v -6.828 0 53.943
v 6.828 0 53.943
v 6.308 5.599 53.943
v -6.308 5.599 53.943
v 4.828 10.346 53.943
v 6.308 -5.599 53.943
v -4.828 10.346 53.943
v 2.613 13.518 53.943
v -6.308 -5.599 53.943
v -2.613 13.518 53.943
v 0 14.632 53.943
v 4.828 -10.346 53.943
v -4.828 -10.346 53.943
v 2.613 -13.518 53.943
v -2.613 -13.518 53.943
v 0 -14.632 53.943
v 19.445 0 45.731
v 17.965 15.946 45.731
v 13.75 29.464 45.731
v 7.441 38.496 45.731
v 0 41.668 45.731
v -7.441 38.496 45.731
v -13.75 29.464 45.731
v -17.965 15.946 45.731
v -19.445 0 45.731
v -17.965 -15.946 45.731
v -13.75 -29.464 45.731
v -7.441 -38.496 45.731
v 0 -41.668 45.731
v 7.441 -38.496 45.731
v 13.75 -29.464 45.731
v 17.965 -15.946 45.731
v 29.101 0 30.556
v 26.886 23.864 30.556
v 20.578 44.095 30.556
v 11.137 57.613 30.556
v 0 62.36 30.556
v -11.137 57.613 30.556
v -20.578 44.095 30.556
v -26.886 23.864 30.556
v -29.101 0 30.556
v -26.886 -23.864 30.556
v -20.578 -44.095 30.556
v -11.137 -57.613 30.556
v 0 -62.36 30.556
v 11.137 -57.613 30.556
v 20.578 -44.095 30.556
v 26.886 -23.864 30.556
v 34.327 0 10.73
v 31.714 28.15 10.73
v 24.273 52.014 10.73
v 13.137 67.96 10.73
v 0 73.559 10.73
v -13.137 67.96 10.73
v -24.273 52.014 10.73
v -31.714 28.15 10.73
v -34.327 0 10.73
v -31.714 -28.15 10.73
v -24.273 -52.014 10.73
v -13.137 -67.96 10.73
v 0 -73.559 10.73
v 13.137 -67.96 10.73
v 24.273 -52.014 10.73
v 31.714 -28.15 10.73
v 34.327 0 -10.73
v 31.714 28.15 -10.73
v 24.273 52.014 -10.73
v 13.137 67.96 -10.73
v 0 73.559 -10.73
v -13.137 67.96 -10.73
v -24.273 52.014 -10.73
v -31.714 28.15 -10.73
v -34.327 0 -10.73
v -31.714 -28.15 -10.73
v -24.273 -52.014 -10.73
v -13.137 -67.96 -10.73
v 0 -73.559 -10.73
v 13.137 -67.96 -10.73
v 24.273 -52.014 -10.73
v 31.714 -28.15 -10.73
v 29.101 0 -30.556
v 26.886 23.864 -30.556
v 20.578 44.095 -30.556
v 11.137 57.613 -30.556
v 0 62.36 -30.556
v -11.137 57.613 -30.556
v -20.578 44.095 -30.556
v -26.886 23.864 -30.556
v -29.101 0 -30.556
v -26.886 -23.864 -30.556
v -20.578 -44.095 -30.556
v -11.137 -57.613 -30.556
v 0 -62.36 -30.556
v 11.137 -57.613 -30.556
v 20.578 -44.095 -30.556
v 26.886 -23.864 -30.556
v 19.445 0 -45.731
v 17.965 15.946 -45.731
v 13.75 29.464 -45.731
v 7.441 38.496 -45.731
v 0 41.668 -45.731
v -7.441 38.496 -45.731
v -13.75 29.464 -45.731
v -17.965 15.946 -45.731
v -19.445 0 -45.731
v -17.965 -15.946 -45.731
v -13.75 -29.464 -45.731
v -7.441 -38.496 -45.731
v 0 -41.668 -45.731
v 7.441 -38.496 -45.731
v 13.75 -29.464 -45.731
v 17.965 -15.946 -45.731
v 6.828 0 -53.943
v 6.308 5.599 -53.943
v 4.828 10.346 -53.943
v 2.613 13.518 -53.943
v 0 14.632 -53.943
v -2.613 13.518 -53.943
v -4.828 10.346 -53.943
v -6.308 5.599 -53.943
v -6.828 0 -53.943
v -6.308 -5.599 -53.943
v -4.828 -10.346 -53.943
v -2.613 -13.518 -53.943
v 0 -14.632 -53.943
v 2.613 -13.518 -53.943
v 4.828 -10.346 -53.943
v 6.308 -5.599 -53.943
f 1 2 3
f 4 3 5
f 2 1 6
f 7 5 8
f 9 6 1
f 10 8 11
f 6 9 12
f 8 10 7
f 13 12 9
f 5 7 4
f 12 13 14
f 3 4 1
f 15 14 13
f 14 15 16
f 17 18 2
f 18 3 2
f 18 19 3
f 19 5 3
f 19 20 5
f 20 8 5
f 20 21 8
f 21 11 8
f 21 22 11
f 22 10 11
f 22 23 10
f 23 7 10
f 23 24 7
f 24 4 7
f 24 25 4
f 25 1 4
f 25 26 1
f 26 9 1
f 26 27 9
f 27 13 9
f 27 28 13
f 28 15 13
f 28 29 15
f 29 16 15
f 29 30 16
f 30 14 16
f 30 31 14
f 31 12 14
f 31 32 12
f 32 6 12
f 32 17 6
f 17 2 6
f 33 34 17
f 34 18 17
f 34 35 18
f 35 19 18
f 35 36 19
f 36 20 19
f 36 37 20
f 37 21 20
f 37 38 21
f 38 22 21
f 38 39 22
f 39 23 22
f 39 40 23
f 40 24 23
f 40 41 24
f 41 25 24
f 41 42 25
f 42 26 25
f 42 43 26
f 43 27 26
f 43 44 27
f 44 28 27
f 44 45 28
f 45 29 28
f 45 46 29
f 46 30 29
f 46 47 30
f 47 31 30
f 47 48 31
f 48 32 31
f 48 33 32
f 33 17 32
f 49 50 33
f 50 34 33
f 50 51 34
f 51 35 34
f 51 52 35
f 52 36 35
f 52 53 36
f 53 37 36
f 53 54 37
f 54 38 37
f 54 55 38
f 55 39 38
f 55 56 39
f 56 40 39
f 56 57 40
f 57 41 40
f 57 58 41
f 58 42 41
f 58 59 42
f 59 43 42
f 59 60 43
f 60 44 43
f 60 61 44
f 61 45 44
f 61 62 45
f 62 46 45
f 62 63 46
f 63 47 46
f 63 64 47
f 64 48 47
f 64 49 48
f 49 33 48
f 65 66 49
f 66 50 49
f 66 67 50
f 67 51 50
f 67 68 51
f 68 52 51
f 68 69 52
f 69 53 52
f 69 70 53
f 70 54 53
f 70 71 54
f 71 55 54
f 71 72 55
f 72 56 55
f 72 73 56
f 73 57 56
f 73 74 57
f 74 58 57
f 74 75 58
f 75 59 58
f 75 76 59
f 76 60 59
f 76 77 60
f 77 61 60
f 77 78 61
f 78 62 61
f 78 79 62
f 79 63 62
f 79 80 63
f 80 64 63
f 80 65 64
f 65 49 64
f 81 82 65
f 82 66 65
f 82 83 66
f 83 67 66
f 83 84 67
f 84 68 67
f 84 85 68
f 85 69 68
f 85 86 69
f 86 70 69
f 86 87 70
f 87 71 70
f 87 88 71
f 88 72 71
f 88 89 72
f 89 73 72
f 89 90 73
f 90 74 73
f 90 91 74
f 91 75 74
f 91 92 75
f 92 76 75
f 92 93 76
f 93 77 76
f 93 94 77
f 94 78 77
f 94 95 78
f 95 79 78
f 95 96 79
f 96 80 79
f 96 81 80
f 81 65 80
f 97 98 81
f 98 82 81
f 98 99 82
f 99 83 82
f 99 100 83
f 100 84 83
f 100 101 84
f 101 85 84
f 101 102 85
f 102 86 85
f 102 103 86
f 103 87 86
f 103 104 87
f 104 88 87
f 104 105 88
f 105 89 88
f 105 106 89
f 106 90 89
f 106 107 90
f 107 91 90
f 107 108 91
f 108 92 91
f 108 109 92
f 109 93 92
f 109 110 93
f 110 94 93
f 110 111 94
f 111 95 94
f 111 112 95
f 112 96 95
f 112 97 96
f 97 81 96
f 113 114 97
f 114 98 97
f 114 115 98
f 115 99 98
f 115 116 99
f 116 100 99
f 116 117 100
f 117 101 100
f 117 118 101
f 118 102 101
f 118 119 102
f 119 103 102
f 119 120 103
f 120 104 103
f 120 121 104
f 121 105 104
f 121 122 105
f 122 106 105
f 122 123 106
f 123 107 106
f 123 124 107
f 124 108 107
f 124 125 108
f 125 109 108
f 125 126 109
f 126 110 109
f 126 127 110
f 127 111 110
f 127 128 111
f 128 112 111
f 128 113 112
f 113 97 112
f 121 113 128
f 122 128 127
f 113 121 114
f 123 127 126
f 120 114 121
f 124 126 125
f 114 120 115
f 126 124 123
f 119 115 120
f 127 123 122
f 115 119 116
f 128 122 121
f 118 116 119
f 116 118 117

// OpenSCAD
// Generated by SolidPython 1.0.1 on 2020-07-29 00:46:48


scale(v = [7, 15, 11]) {
	sphere(r = 5);
}
/***********************************************
*********      SolidPython code:      **********
************************************************
 
# import packages: SolidPython
from solid import *
from solid.utils import *
from itertools import chain, combinations, permutations


class Resize:

    def __init__(self, scad_file):
        self.scad_file = scad_file
        #self.scad_file = import_scad(scad_file)
        # cone/cylinder param:
        self.r1 = 0
        self.r2 = 0
        self.h = 0
        # rectangular prism param:
        self.w = 0
        self.l = 0
        # ellipse param:
        self.r = 0

    # import OpenScad code (file name corresponds to shape)


    # classify shape + parameters
    def assign(self, param1, param2, param3):
        if self.scad_file == 'cone.scad':
            self.r1 = param1
            self.r2 = param2
            self.h = param3
        elif self.scad_file == 'cylinder.scad':
            self.r1 = param1
            self.r2 = param2
            self.h = param3
        elif self.scad_file == 'rectangularPrism.scad':
            self.h = param1
            self.l = param2
            self.w = param3
        else:
            self.r = param1
            self.h = param2

    # resize parameters
    def iterate(self):
        x = range(3, 20, 2)
        i = 1
        if self.scad_file == 'cone.scad':
            tempList = list(permutations(x, 2))
            for temp in tempList:
                param1 = temp[0]
                param2 = temp[1]
                filepath = 'produced_scad_files/' + 'cone' + str(param1) + '_' + str(param2) + '_' + '.scad'
                scad_render_to_file(cylinder(h=param1, r1=param2, r2=0), filepath)

        elif self.scad_file == 'cylinder.scad':
            tempList = list(permutations(x, 3))
            for temp in tempList:
                param1 = temp[0]
                param2 = temp[1]
                filepath = 'produced_scad_files/' + 'cylinder' + str(param1) + '_' + str(param2) + '_' + '.scad'
                scad_render_to_file(cylinder(h=param1, r1=param2, r2=param2), filepath)

        elif self.scad_file == 'rectangularPrism.scad':
            tempList = list(permutations(x, 3))
            for temp in tempList:
                param1 = temp[0]
                param2 = temp[1]
                param3 = temp[2]
                filepath = 'produced_scad_files/' + 'rectangularPrism' + str(param1) + '_' + str(param2) + '_' + str(
                    param3) + '.scad'
                scad_render_to_file(cube(size=(param1, param2, param3)), filepath)

        elif self.scad_file == 'ellipse.scad':
            tempList = list(permutations(x, 4))
            for temp in tempList:
                param1 = temp[0]
                param2 = temp[1]
                param3 = temp[2]
                param4 = temp[3]
                filepath = 'produced_scad_files/' + 'ellipse' + str(param1) + '_' + str(param2) + '_' + str(param3) + '_' + str(param4) + '.scad'
                scad_render_to_file(scale([param1, param2, param3])(sphere(r=param4)), filepath)

    def render_to_scadfile(self):
        scad_render_to_file(scad, 'example.scad') 
 
************************************************/
